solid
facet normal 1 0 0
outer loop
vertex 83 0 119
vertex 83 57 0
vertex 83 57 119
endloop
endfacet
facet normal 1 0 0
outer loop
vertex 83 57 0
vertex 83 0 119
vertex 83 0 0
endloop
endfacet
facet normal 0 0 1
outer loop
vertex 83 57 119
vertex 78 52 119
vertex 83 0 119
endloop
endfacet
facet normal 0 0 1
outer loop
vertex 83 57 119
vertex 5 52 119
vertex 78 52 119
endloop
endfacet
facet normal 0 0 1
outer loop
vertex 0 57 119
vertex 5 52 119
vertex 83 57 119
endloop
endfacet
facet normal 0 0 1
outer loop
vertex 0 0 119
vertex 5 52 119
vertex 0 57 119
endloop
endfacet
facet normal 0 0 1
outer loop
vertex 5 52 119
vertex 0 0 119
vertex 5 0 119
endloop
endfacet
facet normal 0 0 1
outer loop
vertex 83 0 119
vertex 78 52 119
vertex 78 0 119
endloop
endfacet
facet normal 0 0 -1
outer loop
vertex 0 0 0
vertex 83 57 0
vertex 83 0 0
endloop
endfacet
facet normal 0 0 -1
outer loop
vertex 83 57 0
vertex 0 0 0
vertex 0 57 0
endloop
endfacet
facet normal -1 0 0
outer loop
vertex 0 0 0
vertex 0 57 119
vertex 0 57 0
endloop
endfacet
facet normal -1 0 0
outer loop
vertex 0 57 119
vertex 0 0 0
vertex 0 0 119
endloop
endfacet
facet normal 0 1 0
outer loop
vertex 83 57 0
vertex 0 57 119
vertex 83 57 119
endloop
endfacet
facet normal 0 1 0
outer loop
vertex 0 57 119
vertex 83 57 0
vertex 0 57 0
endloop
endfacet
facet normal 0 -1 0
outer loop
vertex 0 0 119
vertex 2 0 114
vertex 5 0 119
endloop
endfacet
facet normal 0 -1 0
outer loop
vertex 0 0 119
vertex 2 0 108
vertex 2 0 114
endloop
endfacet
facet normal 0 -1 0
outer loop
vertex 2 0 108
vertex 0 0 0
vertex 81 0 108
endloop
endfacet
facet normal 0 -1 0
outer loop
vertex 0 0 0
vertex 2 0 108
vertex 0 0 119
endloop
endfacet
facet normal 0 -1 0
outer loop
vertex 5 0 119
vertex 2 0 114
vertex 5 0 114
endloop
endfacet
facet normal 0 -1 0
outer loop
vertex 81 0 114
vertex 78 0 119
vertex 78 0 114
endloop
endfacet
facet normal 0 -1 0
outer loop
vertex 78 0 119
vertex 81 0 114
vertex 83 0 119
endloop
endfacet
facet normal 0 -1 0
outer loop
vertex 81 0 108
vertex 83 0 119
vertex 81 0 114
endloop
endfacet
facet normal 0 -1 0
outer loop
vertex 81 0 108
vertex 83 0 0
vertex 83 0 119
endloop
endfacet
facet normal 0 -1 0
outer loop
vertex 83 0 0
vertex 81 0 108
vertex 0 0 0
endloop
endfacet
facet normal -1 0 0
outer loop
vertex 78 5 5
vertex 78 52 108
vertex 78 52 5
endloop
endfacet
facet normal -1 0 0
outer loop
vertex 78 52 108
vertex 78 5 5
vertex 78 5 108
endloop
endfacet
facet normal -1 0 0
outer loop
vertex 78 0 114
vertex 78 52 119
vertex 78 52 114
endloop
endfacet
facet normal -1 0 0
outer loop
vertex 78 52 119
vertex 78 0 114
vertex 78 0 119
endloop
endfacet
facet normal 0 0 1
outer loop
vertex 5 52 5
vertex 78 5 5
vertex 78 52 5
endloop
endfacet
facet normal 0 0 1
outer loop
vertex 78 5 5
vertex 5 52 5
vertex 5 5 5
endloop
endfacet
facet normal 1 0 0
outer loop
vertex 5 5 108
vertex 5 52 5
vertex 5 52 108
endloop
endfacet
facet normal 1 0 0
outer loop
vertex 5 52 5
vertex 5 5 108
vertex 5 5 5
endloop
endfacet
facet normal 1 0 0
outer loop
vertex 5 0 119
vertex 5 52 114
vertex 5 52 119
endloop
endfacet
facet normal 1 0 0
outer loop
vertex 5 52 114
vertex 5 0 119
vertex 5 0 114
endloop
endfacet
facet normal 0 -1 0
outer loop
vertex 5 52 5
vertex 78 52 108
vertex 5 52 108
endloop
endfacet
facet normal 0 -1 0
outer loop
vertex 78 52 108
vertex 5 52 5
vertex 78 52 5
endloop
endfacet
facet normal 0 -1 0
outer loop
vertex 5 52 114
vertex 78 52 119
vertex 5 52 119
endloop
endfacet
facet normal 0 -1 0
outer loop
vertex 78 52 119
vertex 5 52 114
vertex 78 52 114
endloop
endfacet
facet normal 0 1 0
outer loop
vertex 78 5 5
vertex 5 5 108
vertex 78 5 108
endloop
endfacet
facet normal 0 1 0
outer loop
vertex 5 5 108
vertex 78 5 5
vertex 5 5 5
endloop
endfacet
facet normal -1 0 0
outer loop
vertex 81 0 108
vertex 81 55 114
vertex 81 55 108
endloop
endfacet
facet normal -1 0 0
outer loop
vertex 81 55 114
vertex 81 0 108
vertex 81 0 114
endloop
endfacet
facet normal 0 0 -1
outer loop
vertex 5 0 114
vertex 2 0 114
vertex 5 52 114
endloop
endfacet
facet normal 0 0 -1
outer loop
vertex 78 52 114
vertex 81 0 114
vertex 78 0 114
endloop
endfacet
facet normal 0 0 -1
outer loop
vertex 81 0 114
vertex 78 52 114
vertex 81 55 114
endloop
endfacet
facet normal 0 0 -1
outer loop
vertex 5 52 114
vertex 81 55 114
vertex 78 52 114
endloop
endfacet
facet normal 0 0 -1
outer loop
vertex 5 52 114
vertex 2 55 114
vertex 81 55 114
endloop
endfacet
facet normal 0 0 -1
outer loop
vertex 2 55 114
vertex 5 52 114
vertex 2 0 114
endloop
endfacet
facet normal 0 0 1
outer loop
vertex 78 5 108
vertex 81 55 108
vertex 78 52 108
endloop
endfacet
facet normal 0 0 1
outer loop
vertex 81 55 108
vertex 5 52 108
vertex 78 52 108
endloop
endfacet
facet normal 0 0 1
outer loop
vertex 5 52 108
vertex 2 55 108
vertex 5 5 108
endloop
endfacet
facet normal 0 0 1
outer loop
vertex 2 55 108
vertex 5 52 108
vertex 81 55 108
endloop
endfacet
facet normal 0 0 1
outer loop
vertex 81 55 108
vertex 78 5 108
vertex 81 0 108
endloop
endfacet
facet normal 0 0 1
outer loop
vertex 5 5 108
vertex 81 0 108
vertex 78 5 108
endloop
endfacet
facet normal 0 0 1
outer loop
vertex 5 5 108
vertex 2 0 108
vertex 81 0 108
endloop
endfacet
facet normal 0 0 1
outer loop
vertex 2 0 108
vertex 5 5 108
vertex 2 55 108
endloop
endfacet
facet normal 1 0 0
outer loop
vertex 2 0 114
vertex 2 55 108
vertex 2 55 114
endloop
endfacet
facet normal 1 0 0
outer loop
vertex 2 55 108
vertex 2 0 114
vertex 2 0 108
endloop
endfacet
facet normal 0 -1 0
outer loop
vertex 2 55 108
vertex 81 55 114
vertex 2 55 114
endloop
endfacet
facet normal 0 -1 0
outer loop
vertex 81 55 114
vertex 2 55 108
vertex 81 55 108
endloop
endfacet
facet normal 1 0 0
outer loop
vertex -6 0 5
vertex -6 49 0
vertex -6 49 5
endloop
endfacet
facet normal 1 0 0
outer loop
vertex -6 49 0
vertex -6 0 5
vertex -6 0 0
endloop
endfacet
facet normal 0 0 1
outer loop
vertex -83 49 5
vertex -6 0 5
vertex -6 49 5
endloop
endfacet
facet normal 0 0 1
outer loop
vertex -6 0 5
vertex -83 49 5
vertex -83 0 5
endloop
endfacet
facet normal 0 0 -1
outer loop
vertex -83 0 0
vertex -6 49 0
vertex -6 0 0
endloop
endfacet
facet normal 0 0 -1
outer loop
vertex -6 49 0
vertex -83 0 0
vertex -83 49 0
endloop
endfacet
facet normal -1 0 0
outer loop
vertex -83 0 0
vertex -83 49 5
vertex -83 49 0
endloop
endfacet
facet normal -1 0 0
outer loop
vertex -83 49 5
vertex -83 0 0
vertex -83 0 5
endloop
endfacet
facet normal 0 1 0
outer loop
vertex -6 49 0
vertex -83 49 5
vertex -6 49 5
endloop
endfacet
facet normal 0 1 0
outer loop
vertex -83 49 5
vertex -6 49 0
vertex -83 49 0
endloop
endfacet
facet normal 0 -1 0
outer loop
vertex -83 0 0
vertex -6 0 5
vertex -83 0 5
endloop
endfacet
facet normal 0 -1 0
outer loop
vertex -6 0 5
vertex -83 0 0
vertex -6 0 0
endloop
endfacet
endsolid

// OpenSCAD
union() {
	difference() {
		difference() {
			difference() {
				cube(size = [83, 57, 119]);
				translate(v = [5, 5, 5]) {
					cube(size = [73, 47, 1000]);
				}
			}
			translate(v = [2, -1, 108]) {
				cube(size = [79, 56, 6]);
			}
		}
		translate(v = [5, -1, 108]) {
			cube(size = [73, 7, 100]);
		}
	}
	translate(v = [-83, 0, 0]) {
		cube(size = [77, 49, 5]);
	}
}
